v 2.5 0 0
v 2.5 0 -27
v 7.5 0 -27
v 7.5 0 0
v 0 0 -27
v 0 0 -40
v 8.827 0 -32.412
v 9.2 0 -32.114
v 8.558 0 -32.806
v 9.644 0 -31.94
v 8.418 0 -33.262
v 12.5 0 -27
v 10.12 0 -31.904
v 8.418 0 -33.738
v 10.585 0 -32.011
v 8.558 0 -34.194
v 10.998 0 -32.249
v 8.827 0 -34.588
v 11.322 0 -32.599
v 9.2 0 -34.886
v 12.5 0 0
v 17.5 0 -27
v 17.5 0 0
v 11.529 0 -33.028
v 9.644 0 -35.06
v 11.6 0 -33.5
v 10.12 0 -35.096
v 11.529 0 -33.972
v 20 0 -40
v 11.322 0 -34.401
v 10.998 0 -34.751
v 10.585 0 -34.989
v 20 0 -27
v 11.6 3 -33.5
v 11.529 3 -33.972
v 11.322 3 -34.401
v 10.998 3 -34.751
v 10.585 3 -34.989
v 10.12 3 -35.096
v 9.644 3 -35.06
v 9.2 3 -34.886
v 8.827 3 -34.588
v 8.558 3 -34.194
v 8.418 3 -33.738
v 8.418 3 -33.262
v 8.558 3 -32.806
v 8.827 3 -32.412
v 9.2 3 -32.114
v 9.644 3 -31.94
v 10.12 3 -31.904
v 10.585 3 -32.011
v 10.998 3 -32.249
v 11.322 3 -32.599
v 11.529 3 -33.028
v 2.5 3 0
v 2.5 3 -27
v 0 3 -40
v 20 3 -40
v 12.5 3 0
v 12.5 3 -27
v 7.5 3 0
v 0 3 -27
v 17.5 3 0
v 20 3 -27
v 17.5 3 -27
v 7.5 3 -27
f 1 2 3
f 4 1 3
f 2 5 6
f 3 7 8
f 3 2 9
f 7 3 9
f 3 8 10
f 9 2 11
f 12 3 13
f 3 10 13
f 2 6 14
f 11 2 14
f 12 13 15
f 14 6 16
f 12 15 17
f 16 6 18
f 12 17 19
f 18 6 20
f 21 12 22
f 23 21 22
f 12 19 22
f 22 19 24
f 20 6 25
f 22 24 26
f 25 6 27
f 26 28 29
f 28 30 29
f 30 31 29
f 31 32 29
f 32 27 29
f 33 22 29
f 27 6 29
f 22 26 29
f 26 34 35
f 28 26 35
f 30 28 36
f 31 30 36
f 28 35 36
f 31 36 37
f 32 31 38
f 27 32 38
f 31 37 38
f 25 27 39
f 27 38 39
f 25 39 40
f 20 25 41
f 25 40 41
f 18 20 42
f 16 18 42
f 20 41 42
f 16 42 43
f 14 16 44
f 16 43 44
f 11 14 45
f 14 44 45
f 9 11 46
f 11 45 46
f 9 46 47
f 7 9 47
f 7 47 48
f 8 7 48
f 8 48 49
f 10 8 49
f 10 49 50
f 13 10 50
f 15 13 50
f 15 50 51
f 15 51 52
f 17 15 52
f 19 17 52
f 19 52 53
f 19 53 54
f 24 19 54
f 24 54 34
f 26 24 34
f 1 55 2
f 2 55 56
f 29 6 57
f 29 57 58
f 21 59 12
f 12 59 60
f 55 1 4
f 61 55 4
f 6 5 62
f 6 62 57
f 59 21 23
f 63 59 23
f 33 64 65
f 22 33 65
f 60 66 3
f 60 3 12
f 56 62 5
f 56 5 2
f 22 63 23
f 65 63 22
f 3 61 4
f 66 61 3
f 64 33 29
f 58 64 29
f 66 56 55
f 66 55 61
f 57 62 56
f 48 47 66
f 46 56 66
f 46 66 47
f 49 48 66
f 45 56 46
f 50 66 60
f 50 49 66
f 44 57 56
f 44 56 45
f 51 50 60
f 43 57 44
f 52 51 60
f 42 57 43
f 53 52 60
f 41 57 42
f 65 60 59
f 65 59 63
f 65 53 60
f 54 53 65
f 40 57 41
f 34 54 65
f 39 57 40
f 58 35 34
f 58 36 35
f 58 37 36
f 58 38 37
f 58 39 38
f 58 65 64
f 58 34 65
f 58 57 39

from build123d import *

# Parameters (mm, degrees)
SKETCH1_W               = 20
SKETCH1_H               = 40
BOSS_EXTRUDE1_DEPTH     = 3
SKETCH2_W               = 2.5
SKETCH2_H               = 27
CUT_EXTRUDE1_DEPTH      = 3
SKETCH3_R               = 1.6
CUT_EXTRUDE2_DEPTH      = 1
CUT_EXTRUDE2_DEPTH_BACK = 4
SKETCH4_W               = 5
SKETCH4_H               = 27
CUT_EXTRUDE3_DEPTH      = 1
CUT_EXTRUDE3_DEPTH_BACK = 4


with BuildPart() as part:
    # Sketch1 → Boss-Extrude1 (new body)
    with BuildSketch(Plane(origin=(0, 0, 0), x_dir=(1, 0, 0), z_dir=(0, 1, 0))):
        with Locations((10, 20)):
            Rectangle(SKETCH1_W, SKETCH1_H)
    extrude(amount=BOSS_EXTRUDE1_DEPTH)

    # Sketch2 → Cut-Extrude1 (cut)
    with BuildSketch(Plane(origin=(0, 3, 0), x_dir=(1, 0, 0), z_dir=(0, 1, 0))):
        with Locations((1.25, 13.5)):
            Rectangle(SKETCH2_W, SKETCH2_H)
    cut_extrude1 = extrude(amount=-CUT_EXTRUDE1_DEPTH, mode=Mode.SUBTRACT)

    # Mirror1: Cut-Extrude1 across plane
    add(cut_extrude1.mirror(Plane.ZY.offset(-10)), mode=Mode.SUBTRACT)

    # Sketch3 → Cut-Extrude2 (cut, two sides)
    with BuildSketch(Plane(origin=(0, 3, 0), x_dir=(1, 0, 0), z_dir=(0, 1, 0))) as cut_extrude2_sk:
        with Locations((10, 33.5)):
            Circle(SKETCH3_R)
    extrude(amount=CUT_EXTRUDE2_DEPTH, mode=Mode.SUBTRACT)
    extrude(cut_extrude2_sk.sketch, amount=-CUT_EXTRUDE2_DEPTH_BACK, mode=Mode.SUBTRACT)

    # Sketch4 → Cut-Extrude3 (cut, two sides)
    with BuildSketch(Plane(origin=(0, 3, 0), x_dir=(1, 0, 0), z_dir=(0, 1, 0))) as cut_extrude3_sk:
        with Locations((10, 13.5)):
            Rectangle(SKETCH4_W, SKETCH4_H)
    extrude(amount=CUT_EXTRUDE3_DEPTH, mode=Mode.SUBTRACT)
    extrude(cut_extrude3_sk.sketch, amount=-CUT_EXTRUDE3_DEPTH_BACK, mode=Mode.SUBTRACT)


solid = part.part
